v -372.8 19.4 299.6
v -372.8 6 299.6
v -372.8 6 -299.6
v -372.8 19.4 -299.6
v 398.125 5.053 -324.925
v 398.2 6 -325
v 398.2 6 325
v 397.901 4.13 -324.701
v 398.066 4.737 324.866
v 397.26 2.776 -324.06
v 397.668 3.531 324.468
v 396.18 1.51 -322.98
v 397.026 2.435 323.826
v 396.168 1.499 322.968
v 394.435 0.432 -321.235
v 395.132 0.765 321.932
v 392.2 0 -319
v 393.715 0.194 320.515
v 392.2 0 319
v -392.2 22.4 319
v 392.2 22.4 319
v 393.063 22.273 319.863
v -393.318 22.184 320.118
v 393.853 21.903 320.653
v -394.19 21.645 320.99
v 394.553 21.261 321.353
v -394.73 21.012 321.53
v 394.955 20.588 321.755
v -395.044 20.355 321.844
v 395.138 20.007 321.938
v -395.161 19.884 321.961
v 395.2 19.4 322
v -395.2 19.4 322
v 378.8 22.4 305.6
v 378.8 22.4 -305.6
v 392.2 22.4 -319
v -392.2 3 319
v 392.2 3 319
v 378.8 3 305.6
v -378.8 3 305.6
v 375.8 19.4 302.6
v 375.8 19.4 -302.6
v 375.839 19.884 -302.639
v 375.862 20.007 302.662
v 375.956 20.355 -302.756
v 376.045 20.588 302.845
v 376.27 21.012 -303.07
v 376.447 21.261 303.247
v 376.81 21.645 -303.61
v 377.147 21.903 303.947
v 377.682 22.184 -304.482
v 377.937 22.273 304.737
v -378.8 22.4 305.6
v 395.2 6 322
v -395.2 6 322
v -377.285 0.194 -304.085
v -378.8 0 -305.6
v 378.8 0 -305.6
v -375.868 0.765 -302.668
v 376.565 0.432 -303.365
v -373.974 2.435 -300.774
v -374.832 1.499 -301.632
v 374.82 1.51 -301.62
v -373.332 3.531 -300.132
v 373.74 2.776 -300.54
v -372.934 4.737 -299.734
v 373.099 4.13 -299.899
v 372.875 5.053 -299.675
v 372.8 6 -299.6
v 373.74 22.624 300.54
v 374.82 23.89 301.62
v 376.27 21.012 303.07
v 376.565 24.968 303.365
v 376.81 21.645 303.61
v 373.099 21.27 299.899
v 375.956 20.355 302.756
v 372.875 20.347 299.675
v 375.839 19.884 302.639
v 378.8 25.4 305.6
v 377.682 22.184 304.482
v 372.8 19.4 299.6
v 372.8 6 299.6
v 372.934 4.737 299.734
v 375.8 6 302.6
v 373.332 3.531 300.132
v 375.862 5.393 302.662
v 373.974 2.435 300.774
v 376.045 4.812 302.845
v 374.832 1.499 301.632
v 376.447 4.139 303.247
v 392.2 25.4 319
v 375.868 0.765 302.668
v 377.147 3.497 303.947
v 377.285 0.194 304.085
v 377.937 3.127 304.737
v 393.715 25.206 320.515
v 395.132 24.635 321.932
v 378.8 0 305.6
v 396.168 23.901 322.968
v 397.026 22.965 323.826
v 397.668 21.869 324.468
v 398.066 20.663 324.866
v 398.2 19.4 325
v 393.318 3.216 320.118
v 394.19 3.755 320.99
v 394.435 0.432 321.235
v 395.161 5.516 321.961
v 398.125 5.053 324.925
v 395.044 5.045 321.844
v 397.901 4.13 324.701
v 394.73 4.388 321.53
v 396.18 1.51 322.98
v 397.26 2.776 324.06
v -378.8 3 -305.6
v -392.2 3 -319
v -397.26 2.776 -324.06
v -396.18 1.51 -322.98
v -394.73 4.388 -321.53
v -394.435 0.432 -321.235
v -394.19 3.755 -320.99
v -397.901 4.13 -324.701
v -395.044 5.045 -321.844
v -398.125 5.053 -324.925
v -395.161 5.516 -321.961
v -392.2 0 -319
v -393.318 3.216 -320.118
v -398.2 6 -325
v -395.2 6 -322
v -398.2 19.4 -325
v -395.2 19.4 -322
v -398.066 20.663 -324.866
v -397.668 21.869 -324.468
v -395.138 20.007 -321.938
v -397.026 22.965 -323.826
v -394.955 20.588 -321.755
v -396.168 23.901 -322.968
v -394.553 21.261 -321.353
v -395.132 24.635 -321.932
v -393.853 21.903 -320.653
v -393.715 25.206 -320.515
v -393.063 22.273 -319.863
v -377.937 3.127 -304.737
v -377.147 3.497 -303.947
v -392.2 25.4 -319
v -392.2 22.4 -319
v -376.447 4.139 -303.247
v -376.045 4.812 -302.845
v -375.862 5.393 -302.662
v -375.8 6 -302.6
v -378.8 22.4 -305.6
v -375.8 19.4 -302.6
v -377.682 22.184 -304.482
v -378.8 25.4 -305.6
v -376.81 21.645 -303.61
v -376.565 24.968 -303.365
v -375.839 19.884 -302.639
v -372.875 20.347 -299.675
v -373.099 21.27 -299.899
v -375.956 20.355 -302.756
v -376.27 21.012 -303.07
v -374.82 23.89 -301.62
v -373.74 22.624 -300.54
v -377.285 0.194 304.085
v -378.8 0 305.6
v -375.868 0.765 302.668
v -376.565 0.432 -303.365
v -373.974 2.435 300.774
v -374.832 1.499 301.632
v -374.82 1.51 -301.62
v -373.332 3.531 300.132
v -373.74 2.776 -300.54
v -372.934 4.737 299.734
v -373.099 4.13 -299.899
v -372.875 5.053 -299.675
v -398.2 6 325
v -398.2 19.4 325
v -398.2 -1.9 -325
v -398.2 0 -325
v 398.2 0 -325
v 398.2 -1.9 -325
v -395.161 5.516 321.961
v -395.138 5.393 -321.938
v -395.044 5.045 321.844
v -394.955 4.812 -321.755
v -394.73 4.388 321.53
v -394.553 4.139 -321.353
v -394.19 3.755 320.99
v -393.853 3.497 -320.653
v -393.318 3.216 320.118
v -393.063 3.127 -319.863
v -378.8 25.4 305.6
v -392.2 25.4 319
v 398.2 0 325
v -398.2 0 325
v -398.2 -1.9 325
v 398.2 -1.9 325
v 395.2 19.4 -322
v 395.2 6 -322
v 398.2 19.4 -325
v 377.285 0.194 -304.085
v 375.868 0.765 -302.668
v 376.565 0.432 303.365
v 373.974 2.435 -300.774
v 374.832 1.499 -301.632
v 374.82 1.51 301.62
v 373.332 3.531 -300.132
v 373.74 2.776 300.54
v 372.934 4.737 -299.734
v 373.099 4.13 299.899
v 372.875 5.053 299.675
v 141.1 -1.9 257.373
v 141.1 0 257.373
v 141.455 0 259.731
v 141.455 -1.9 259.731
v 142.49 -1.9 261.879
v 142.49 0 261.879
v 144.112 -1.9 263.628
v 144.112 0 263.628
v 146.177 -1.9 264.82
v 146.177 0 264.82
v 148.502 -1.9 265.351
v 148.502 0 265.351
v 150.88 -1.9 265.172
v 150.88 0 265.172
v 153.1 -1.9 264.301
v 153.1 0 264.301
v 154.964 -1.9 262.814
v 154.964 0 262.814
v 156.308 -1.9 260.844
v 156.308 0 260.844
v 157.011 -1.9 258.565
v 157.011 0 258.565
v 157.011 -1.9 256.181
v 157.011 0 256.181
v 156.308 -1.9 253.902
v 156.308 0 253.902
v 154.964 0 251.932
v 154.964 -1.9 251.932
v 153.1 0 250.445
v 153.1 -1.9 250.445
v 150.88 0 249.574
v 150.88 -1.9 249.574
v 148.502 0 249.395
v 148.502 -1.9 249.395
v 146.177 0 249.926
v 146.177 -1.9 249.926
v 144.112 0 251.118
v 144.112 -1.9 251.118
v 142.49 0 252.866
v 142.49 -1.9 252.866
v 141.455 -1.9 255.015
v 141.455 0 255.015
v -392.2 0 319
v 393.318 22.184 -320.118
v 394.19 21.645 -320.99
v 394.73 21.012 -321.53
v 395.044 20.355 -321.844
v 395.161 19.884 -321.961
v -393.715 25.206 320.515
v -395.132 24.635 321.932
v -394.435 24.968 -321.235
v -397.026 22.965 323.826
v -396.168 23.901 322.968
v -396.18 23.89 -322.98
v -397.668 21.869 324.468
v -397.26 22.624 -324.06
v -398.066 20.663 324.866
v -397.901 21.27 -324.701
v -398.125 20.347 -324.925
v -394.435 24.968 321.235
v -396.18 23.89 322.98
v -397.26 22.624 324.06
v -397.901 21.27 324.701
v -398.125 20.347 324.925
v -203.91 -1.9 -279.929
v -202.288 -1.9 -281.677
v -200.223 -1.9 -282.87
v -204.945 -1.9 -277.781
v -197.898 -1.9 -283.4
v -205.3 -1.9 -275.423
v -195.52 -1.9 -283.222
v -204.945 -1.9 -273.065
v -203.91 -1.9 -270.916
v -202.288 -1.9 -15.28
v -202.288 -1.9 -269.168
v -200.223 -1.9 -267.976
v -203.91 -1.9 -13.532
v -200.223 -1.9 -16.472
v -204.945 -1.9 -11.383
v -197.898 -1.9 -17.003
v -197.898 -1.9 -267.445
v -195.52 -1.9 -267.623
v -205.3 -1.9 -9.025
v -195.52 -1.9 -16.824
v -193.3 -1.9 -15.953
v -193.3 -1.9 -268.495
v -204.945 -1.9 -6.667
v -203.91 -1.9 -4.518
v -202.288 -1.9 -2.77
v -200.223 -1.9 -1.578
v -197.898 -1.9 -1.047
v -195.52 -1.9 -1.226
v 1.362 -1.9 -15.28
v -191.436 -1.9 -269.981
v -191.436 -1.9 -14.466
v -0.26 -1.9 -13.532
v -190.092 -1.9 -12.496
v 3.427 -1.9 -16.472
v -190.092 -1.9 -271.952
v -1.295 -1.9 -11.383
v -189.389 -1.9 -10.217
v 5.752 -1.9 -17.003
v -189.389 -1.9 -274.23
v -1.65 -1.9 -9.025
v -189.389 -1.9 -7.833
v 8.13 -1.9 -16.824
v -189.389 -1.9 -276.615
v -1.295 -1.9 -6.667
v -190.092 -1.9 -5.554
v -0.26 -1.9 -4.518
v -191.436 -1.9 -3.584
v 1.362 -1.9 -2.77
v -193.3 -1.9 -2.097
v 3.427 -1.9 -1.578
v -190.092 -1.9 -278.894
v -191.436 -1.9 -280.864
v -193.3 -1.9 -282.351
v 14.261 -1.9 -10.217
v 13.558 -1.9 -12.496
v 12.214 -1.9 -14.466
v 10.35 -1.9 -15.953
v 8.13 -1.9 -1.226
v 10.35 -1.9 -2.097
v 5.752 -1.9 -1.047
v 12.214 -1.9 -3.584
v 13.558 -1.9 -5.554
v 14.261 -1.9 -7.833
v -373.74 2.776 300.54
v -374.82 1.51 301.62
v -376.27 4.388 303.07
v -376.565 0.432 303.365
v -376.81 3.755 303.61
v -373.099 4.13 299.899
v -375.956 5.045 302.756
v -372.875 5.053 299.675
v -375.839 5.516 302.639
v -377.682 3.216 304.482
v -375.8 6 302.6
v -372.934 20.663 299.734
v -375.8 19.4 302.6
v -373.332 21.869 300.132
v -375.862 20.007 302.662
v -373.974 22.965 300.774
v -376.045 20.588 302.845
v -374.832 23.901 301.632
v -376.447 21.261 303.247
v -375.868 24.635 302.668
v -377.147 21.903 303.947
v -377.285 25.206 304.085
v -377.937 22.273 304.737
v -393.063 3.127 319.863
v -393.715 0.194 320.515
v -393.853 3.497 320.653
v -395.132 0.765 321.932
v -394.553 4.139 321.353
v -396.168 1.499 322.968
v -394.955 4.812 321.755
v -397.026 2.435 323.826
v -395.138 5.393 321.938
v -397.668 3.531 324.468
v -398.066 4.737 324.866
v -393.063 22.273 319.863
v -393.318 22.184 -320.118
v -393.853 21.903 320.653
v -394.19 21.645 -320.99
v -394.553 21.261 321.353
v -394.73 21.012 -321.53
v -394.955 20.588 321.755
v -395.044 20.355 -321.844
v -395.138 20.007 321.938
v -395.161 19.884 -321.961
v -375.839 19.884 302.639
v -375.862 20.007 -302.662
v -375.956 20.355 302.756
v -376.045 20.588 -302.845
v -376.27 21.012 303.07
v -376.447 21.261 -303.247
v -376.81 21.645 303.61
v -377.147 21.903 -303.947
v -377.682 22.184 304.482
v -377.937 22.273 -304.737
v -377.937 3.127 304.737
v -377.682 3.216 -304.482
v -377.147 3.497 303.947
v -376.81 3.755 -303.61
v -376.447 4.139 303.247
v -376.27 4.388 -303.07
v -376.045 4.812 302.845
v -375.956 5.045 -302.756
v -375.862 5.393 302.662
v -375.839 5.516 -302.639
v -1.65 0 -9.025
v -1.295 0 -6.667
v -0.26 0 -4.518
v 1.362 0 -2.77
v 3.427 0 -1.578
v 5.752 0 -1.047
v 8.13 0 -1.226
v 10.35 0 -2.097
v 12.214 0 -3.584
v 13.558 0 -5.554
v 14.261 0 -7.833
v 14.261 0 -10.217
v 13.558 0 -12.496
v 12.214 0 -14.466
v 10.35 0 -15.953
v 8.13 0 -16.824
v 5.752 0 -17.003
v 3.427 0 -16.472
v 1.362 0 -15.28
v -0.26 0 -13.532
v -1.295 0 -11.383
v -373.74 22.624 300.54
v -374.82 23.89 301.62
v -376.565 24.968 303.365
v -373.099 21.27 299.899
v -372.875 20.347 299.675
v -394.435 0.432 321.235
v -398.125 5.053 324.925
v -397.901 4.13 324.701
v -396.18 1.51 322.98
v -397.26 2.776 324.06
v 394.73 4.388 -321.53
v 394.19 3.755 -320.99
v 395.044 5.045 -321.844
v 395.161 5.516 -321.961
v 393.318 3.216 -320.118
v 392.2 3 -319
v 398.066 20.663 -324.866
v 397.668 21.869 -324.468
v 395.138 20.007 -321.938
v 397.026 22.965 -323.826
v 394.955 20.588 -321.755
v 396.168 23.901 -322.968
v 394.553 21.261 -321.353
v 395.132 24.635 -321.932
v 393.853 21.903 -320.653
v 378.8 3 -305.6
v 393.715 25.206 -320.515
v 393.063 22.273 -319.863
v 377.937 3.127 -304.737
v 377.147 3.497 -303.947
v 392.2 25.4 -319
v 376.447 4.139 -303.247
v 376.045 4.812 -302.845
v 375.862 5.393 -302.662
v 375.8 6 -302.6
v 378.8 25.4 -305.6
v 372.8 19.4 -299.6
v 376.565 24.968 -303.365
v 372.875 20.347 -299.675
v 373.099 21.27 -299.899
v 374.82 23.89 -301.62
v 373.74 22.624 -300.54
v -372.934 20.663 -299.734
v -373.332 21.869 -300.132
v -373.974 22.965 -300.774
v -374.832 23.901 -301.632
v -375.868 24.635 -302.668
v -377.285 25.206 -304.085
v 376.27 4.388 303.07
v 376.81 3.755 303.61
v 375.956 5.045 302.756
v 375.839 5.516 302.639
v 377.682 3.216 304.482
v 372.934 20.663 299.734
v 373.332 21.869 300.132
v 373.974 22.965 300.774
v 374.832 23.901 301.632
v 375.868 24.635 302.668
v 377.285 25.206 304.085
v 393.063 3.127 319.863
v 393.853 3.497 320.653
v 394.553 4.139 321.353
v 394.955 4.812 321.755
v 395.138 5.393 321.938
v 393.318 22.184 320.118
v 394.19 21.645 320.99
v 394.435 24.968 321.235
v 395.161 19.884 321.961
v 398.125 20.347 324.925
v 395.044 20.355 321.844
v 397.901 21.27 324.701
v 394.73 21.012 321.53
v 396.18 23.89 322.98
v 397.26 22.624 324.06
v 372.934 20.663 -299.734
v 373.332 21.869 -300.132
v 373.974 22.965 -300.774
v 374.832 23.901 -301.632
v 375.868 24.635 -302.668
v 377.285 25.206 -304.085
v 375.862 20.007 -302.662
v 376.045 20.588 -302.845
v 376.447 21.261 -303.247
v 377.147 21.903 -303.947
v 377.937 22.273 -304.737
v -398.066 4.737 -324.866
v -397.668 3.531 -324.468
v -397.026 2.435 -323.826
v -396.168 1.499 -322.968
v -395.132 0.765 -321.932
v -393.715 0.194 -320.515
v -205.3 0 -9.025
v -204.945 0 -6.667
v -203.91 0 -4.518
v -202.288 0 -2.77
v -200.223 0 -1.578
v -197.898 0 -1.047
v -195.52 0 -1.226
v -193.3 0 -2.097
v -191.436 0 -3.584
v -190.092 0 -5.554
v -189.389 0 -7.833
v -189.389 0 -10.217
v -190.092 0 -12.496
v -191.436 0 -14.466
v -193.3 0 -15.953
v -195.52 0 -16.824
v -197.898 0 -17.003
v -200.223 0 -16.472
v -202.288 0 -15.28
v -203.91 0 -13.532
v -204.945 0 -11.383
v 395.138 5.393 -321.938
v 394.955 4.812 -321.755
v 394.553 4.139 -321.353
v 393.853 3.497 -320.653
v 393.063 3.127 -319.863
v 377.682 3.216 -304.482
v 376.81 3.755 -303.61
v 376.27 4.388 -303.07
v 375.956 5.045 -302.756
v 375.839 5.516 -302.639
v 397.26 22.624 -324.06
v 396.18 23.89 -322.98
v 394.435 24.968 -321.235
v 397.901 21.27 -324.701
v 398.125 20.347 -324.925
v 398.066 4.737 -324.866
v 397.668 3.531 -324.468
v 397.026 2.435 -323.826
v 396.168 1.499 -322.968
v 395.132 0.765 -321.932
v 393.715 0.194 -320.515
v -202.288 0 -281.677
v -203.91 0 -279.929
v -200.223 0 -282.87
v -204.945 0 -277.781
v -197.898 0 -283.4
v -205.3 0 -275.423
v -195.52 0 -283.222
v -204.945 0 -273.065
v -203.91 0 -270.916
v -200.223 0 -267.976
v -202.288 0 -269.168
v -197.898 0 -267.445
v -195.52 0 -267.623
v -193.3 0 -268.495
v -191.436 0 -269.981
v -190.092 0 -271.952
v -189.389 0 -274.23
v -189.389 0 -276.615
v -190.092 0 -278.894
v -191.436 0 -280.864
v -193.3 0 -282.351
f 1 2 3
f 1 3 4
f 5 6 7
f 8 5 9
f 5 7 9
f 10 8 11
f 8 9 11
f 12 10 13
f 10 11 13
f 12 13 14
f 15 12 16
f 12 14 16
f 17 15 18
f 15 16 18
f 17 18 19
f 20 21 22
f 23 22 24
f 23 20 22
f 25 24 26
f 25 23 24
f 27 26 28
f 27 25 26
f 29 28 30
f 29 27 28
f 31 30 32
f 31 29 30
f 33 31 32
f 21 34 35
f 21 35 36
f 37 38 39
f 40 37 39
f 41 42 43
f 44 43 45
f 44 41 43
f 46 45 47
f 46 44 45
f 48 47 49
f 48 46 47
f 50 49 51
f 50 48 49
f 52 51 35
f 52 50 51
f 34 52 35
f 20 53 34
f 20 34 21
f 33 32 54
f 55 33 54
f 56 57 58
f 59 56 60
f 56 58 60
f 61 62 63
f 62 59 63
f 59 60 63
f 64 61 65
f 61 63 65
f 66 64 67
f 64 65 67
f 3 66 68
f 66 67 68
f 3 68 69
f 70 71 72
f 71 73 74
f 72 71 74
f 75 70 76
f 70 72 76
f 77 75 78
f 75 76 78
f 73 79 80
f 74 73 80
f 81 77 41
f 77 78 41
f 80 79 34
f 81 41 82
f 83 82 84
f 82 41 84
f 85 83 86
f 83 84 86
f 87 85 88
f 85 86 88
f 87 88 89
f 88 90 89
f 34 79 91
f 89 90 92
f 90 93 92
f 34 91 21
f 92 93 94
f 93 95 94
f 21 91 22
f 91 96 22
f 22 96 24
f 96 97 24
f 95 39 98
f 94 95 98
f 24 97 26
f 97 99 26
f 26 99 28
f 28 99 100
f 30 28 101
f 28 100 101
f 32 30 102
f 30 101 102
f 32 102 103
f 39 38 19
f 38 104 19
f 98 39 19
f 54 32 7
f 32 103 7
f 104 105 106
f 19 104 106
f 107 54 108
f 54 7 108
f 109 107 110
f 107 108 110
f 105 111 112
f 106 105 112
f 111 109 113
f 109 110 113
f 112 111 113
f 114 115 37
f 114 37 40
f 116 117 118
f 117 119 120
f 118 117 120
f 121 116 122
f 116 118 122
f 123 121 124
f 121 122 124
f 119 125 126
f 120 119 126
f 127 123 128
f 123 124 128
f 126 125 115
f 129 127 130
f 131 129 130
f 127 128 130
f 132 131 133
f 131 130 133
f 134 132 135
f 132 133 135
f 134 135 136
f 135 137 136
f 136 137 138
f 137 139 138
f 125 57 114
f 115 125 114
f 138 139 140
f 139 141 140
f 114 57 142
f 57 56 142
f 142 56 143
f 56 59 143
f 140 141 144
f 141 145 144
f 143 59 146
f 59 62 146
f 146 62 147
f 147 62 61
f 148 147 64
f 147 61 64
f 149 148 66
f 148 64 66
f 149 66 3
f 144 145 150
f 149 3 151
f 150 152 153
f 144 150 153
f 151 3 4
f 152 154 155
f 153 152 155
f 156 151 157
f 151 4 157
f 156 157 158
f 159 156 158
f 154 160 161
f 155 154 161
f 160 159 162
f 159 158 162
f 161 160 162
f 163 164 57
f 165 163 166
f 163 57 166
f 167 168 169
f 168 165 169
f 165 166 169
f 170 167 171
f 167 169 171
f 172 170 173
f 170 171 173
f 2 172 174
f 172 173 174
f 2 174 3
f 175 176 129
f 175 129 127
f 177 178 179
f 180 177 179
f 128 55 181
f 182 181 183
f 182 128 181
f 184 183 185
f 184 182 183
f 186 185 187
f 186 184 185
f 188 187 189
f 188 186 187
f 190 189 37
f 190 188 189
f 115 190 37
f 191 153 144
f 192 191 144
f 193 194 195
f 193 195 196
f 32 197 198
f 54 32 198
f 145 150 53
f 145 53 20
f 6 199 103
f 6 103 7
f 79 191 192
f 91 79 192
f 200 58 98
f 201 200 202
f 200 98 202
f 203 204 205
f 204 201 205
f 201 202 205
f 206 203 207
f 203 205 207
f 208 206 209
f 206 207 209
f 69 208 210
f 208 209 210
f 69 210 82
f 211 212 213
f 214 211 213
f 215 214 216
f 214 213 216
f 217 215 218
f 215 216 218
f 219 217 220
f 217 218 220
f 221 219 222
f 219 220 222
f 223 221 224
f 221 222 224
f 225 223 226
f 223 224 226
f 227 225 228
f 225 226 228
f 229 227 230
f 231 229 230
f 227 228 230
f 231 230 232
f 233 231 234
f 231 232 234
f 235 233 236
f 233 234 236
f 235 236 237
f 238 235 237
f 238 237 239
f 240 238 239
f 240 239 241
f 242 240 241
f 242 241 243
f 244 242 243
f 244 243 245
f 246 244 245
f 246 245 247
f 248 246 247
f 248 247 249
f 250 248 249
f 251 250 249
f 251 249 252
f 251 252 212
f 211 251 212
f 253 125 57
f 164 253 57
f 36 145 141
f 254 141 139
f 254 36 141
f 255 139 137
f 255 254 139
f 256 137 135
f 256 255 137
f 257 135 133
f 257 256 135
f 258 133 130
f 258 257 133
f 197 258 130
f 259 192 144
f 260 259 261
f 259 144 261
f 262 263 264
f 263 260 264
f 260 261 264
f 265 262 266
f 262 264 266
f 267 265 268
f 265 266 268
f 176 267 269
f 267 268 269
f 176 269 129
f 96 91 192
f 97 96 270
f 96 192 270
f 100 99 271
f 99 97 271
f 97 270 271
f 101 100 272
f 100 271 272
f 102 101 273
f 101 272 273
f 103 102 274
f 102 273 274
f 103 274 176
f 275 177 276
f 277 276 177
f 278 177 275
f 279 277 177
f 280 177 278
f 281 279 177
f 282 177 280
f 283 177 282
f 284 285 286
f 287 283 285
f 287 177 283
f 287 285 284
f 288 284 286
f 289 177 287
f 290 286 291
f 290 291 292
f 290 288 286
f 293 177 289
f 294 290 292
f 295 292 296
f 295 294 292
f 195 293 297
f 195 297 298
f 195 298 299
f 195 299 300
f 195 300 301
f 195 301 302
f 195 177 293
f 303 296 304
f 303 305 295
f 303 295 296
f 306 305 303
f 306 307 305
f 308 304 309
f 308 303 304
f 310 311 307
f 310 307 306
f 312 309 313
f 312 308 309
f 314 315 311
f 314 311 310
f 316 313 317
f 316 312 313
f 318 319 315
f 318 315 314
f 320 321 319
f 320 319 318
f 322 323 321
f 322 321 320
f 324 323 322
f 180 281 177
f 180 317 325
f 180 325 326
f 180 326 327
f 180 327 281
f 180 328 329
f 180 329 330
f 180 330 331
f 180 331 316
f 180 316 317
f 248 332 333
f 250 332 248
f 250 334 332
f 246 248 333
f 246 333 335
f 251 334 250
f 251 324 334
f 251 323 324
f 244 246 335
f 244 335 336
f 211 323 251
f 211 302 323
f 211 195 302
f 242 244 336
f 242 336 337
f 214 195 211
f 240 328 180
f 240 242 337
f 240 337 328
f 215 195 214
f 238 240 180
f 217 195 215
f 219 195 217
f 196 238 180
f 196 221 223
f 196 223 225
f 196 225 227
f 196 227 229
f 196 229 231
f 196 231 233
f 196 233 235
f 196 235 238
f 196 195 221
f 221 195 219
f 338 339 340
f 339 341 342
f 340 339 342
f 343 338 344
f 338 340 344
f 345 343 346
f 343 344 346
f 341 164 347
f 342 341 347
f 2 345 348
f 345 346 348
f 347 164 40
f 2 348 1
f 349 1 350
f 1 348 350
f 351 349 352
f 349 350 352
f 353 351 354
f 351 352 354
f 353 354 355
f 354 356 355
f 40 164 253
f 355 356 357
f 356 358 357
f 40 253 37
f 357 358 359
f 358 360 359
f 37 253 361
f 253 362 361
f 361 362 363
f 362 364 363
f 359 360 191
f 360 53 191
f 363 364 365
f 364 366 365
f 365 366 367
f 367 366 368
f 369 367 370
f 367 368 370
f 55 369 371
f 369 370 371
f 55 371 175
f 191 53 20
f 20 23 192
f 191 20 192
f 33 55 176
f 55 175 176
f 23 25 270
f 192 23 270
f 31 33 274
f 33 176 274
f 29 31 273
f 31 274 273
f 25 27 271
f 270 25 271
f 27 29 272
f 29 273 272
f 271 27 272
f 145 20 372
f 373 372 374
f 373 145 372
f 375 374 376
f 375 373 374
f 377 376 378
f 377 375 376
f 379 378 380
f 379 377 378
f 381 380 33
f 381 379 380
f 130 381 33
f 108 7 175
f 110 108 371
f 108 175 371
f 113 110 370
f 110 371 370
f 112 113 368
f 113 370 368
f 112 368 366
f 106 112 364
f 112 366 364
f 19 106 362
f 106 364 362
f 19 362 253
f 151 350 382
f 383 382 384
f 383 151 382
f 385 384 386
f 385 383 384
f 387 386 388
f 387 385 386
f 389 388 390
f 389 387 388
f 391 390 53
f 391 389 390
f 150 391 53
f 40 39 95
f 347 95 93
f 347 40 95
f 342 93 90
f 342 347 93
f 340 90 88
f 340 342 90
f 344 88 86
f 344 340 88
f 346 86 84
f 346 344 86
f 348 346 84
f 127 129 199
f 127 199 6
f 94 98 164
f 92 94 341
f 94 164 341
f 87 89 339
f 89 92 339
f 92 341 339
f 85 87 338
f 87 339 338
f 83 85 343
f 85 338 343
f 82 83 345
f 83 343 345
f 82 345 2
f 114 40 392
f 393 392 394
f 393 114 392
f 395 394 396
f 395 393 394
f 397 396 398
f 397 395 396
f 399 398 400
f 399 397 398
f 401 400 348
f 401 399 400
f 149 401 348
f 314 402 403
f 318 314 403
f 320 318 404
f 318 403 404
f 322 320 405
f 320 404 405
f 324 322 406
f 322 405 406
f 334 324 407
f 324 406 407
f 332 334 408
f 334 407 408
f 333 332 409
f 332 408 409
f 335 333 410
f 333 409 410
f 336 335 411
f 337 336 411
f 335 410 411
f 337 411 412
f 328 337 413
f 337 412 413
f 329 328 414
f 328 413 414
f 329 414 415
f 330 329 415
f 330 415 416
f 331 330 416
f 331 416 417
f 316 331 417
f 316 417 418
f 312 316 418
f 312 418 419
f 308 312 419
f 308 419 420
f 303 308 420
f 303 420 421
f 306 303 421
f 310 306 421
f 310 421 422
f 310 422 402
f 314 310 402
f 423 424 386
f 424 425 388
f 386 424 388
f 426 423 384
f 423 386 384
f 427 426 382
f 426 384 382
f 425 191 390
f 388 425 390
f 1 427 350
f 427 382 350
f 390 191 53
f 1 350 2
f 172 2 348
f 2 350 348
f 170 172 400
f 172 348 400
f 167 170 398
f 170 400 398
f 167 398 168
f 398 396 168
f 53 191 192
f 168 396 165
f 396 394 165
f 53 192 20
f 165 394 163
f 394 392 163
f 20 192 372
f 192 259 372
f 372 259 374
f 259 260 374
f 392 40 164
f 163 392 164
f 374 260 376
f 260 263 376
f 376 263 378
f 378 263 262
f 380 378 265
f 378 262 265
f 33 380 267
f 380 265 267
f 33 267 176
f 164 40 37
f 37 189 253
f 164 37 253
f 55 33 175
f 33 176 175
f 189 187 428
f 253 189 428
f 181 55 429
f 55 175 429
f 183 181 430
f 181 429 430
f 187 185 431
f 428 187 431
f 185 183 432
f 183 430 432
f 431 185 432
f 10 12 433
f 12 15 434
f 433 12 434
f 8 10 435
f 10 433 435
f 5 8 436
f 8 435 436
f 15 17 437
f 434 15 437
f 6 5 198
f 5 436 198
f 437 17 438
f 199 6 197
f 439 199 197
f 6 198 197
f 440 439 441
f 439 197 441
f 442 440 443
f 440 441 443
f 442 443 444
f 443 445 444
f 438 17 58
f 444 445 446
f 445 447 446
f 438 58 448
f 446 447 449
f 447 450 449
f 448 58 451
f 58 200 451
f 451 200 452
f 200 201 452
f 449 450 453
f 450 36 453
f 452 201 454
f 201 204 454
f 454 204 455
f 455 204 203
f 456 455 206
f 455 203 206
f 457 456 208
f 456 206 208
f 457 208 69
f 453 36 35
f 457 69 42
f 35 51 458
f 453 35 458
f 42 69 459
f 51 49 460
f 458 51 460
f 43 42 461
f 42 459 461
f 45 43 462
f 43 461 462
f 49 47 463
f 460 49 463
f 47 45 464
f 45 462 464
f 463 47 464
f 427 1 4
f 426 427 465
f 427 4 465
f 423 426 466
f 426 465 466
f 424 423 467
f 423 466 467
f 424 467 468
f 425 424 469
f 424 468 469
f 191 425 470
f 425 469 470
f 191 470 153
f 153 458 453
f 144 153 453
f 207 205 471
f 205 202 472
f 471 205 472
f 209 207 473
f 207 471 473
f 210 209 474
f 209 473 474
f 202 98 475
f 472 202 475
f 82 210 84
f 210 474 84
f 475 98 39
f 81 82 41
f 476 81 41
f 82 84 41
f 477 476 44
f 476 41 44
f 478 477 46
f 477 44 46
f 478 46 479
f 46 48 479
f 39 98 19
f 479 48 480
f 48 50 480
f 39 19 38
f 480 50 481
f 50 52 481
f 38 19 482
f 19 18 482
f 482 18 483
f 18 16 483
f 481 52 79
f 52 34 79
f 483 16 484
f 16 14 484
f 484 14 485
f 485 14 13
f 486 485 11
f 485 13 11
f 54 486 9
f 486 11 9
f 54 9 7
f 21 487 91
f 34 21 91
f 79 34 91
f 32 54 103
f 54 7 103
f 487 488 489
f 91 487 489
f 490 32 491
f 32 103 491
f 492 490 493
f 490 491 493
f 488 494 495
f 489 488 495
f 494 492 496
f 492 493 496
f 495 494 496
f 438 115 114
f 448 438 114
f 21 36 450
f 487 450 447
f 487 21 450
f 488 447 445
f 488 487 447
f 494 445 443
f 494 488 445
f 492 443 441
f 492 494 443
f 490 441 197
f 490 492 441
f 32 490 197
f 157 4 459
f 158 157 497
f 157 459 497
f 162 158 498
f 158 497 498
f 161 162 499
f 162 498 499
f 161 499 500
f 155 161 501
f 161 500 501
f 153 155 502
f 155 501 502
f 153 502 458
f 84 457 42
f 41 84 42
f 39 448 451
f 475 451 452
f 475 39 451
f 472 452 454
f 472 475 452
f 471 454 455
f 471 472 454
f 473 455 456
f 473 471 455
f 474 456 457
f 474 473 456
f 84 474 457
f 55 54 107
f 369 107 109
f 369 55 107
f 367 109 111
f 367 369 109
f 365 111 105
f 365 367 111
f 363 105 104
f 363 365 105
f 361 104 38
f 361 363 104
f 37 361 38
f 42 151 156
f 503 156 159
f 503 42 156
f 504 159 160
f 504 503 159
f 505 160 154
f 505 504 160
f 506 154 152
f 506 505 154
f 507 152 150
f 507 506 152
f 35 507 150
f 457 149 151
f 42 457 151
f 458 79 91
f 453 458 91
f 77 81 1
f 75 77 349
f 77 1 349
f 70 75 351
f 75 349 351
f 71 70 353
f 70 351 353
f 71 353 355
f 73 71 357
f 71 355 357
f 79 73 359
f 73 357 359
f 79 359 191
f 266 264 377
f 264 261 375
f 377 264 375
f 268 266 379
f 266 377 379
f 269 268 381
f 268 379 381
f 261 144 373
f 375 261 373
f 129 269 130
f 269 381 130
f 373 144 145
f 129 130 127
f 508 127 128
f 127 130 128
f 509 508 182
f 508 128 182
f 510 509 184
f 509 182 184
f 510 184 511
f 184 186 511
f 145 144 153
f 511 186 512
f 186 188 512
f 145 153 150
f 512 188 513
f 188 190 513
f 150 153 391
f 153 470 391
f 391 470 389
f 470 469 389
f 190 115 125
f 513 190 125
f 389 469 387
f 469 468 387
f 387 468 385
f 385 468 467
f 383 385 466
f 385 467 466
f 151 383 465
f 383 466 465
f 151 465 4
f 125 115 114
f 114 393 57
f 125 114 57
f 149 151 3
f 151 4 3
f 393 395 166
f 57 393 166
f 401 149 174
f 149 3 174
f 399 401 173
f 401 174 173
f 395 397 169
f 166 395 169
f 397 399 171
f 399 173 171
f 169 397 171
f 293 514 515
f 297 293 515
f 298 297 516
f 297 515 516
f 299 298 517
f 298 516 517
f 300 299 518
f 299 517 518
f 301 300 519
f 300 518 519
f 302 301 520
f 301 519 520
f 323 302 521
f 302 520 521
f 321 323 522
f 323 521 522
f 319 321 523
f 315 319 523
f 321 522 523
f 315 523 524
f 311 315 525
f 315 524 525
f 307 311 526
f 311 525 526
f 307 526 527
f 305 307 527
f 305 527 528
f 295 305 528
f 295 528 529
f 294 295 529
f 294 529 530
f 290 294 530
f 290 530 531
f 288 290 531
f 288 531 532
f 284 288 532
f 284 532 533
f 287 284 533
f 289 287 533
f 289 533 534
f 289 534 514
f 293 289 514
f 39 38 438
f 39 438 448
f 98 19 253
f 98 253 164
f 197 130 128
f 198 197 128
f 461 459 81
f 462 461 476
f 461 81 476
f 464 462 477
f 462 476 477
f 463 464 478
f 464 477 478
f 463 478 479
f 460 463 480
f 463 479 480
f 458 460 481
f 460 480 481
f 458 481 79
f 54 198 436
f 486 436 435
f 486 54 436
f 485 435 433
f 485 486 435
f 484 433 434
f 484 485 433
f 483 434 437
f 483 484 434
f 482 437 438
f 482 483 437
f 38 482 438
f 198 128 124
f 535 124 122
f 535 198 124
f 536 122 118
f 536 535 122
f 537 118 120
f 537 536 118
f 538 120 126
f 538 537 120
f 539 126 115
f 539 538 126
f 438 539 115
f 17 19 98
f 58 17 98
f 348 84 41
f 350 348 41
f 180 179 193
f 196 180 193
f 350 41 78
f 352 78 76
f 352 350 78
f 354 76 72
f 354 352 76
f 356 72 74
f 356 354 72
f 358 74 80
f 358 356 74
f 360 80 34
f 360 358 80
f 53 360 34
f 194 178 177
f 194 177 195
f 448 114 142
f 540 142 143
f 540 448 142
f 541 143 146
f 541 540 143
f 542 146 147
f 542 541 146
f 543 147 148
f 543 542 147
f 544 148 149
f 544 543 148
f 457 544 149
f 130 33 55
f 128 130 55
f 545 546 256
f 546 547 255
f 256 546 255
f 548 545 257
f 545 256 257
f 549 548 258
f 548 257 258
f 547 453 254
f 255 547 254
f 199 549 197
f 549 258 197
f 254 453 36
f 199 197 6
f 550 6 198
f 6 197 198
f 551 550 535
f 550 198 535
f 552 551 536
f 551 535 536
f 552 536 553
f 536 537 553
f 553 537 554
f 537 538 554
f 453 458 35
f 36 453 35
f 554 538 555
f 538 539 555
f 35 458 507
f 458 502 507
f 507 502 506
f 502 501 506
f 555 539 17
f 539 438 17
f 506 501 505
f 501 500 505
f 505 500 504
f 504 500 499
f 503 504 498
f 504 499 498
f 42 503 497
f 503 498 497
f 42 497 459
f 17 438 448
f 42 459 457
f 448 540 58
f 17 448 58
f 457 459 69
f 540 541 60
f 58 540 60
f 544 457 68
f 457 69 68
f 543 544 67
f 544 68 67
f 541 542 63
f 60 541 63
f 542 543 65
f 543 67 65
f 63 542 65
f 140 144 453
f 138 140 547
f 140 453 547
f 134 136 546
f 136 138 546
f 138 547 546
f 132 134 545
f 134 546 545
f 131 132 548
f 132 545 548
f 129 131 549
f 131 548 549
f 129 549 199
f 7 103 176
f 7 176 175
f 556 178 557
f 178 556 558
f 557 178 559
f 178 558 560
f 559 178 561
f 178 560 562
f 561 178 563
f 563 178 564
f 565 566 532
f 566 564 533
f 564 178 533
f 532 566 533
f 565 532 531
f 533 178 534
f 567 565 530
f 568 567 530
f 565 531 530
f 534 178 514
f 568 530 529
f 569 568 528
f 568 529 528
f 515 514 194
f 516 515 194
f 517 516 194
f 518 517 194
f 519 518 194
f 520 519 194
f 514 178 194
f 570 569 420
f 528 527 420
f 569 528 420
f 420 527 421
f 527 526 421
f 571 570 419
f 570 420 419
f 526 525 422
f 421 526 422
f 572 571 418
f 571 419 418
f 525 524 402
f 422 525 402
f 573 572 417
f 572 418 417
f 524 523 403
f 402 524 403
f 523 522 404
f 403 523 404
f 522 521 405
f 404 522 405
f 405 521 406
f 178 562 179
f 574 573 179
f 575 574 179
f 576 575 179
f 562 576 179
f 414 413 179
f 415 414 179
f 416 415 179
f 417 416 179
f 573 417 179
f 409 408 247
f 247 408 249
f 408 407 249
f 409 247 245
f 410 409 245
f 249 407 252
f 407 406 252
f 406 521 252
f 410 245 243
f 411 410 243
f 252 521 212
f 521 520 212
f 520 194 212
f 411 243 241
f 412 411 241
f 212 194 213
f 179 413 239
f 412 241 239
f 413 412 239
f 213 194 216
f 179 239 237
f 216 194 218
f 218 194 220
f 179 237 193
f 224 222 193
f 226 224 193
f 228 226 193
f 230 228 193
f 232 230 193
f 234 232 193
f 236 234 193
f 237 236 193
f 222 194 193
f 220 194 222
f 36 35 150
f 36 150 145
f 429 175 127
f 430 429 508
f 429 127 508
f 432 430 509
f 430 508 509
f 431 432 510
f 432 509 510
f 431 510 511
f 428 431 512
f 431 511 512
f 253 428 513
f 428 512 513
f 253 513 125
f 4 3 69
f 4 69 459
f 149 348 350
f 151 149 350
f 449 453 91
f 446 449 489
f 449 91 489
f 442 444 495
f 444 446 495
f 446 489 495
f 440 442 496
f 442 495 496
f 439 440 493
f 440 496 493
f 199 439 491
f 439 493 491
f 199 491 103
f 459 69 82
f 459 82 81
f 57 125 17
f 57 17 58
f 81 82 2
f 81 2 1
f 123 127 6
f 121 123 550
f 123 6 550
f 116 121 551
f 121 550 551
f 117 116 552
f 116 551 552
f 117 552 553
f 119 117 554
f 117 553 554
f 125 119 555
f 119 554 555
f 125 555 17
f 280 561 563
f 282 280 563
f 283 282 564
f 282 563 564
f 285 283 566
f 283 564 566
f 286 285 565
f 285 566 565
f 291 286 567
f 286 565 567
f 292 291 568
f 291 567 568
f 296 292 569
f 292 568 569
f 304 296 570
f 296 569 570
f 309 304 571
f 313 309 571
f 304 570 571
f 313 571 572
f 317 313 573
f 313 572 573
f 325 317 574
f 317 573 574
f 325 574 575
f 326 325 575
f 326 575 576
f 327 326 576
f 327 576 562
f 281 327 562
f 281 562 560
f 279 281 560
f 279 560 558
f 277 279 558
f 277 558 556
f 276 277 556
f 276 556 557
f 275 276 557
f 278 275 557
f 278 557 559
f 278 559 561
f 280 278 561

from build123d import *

# Parameters (mm, degrees)
TUBO_CUADRADO_2_X_2_X_0_25_1_DEPTH      = 686.921024484
TUBO_CUADRADO_2_X_2_X_0_25_1_DEPTH_BACK = 36.921024484
TUBO_CUADRADO_2_X_2_X_0_25_1_2_DEPTH    = 870.242048969
TUBO_CUADRADO_2_X_2_X_0_25_1_3_DEPTH    = 723.842048969
TUBO_CUADRADO_2_X_2_X_0_25_1_4_DEPTH    = 870.242048969
CROQUIS3_W                              = 796.4
CROQUIS3_H                              = 650
SALIENTE_EXTRUIR1_DEPTH                 = 1.9
CROQUIS5_R                              = 8
CORTAR_EXTRUIR1_DEPTH                   = 10


with BuildPart() as part:
    # Sketch1 → Tubo cuadrado 2 X 2 X 0.25(1) (new, two sides: drawn at the far end of the back side and taken through both)
    with BuildSketch(Plane(origin=(-385.5, 12.7, -325), x_dir=(1, 0, 0), z_dir=(0, 0, 1)).offset(-TUBO_CUADRADO_2_X_2_X_0_25_1_DEPTH_BACK)):
        with BuildLine():
            Line((-6.7, -12.7), (6.7, -12.7))
            ThreePointArc((6.7, -12.7), (10.942640687, -10.942640687), (12.7, -6.7))
            Line((12.7, -6.7), (12.7, 6.7))
            ThreePointArc((12.7, 6.7), (10.942640687, 10.942640687), (6.7, 12.7))
            Line((6.7, 12.7), (-6.7, 12.7))
            ThreePointArc((-6.7, 12.7), (-10.942640687, 10.942640687), (-12.7, 6.7))
            Line((-12.7, 6.7), (-12.7, -6.7))
            ThreePointArc((-12.7, -6.7), (-10.942640687, -10.942640687), (-6.7, -12.7))
        make_face()
        with BuildLine():
            Line((-6.7, -9.7), (6.7, -9.7))
            ThreePointArc((6.7, -9.7), (8.821320344, -8.821320344), (9.7, -6.7))
            Line((9.7, -6.7), (9.7, 6.7))
            ThreePointArc((9.7, 6.7), (8.821320344, 8.821320344), (6.7, 9.7))
            Line((6.7, 9.7), (-6.7, 9.7))
            ThreePointArc((-6.7, 9.7), (-8.821320344, 8.821320344), (-9.7, 6.7))
            Line((-9.7, 6.7), (-9.7, -6.7))
            ThreePointArc((-9.7, -6.7), (-8.821320344, -8.821320344), (-6.7, -9.7))
        make_face(mode=Mode.SUBTRACT)
    extrude(amount=TUBO_CUADRADO_2_X_2_X_0_25_1_DEPTH + TUBO_CUADRADO_2_X_2_X_0_25_1_DEPTH_BACK)

    # Tubo cuadrado 2 X 2 X 0.25(1) mitre 1
    split(bisect_by=Plane(origin=(-398.2, 0, -325), x_dir=(0, -1, 0), z_dir=(-0.707106781, 0, 0.707106781)), keep=Keep.TOP)

    # Tubo cuadrado 2 X 2 X 0.25(1) mitre 2
    split(bisect_by=Plane(origin=(-398.2, 0, 325), x_dir=(0, -1, 0), z_dir=(-0.707106781, 0, -0.707106781)), keep=Keep.TOP)


with BuildPart() as body_2:
    # Sketch1 on segment 2 (carried to segment 2) → Tubo cuadrado 2 X 2 X 0.25_1 2 (new body)
    with BuildSketch(Plane(origin=(-435.121024484, 12.7, 312.3), x_dir=(0, 0, -1), z_dir=(1, 0, 0))):
        with BuildLine():
            Line((-6.7, -12.7), (6.7, -12.7))
            ThreePointArc((6.7, -12.7), (10.942640687, -10.942640687), (12.7, -6.7))
            Line((12.7, -6.7), (12.7, 6.7))
            ThreePointArc((12.7, 6.7), (10.942640687, 10.942640687), (6.7, 12.7))
            Line((6.7, 12.7), (-6.7, 12.7))
            ThreePointArc((-6.7, 12.7), (-10.942640687, 10.942640687), (-12.7, 6.7))
            Line((-12.7, 6.7), (-12.7, -6.7))
            ThreePointArc((-12.7, -6.7), (-10.942640687, -10.942640687), (-6.7, -12.7))
        make_face()
        with BuildLine():
            Line((-6.7, -9.7), (6.7, -9.7))
            ThreePointArc((6.7, -9.7), (8.821320344, -8.821320344), (9.7, -6.7))
            Line((9.7, -6.7), (9.7, 6.7))
            ThreePointArc((9.7, 6.7), (8.821320344, 8.821320344), (6.7, 9.7))
            Line((6.7, 9.7), (-6.7, 9.7))
            ThreePointArc((-6.7, 9.7), (-8.821320344, 8.821320344), (-9.7, 6.7))
            Line((-9.7, 6.7), (-9.7, -6.7))
            ThreePointArc((-9.7, -6.7), (-8.821320344, -8.821320344), (-6.7, -9.7))
        make_face(mode=Mode.SUBTRACT)
    extrude(amount=TUBO_CUADRADO_2_X_2_X_0_25_1_2_DEPTH)

    # Tubo cuadrado 2 X 2 X 0.25_1 2 mitre 1
    split(bisect_by=Plane(origin=(-398.2, 0, 325), x_dir=(0, 1, 0), z_dir=(0.707106781, 0, 0.707106781)), keep=Keep.TOP)

    # Tubo cuadrado 2 X 2 X 0.25_1 2 mitre 2
    split(bisect_by=Plane(origin=(398.2, 0, 325), x_dir=(0, -1, 0), z_dir=(-0.707106781, 0, 0.707106781)), keep=Keep.TOP)


with BuildPart() as body_3:
    # Sketch1 on segment 3 (carried to segment 3) → Tubo cuadrado 2 X 2 X 0.25_1 3 (new body)
    with BuildSketch(Plane(origin=(385.5, 12.7, 361.921024484), x_dir=(-1, 0, 0), z_dir=(0, 0, -1))):
        with BuildLine():
            Line((-6.7, -12.7), (6.7, -12.7))
            ThreePointArc((6.7, -12.7), (10.942640687, -10.942640687), (12.7, -6.7))
            Line((12.7, -6.7), (12.7, 6.7))
            ThreePointArc((12.7, 6.7), (10.942640687, 10.942640687), (6.7, 12.7))
            Line((6.7, 12.7), (-6.7, 12.7))
            ThreePointArc((-6.7, 12.7), (-10.942640687, 10.942640687), (-12.7, 6.7))
            Line((-12.7, 6.7), (-12.7, -6.7))
            ThreePointArc((-12.7, -6.7), (-10.942640687, -10.942640687), (-6.7, -12.7))
        make_face()
        with BuildLine():
            Line((-6.7, -9.7), (6.7, -9.7))
            ThreePointArc((6.7, -9.7), (8.821320344, -8.821320344), (9.7, -6.7))
            Line((9.7, -6.7), (9.7, 6.7))
            ThreePointArc((9.7, 6.7), (8.821320344, 8.821320344), (6.7, 9.7))
            Line((6.7, 9.7), (-6.7, 9.7))
            ThreePointArc((-6.7, 9.7), (-8.821320344, 8.821320344), (-9.7, 6.7))
            Line((-9.7, 6.7), (-9.7, -6.7))
            ThreePointArc((-9.7, -6.7), (-8.821320344, -8.821320344), (-6.7, -9.7))
        make_face(mode=Mode.SUBTRACT)
    extrude(amount=TUBO_CUADRADO_2_X_2_X_0_25_1_3_DEPTH)

    # Tubo cuadrado 2 X 2 X 0.25_1 3 mitre 1
    split(bisect_by=Plane(origin=(398.2, 0, -325), x_dir=(0, 1, 0), z_dir=(0.707106781, 0, 0.707106781)), keep=Keep.TOP)

    # Tubo cuadrado 2 X 2 X 0.25_1 3 mitre 2
    split(bisect_by=Plane(origin=(398.2, 0, 325), x_dir=(0, 1, 0), z_dir=(0.707106781, 0, -0.707106781)), keep=Keep.TOP)


with BuildPart() as body_4:
    # Sketch1 on segment 4 (carried to segment 4) → Tubo cuadrado 2 X 2 X 0.25_1 4 (new body)
    with BuildSketch(Plane(origin=(435.121024484, 12.7, -312.3), x_dir=(0, 0, 1), z_dir=(-1, 0, 0))):
        with BuildLine():
            Line((-6.7, -12.7), (6.7, -12.7))
            ThreePointArc((6.7, -12.7), (10.942640687, -10.942640687), (12.7, -6.7))
            Line((12.7, -6.7), (12.7, 6.7))
            ThreePointArc((12.7, 6.7), (10.942640687, 10.942640687), (6.7, 12.7))
            Line((6.7, 12.7), (-6.7, 12.7))
            ThreePointArc((-6.7, 12.7), (-10.942640687, 10.942640687), (-12.7, 6.7))
            Line((-12.7, 6.7), (-12.7, -6.7))
            ThreePointArc((-12.7, -6.7), (-10.942640687, -10.942640687), (-6.7, -12.7))
        make_face()
        with BuildLine():
            Line((-6.7, -9.7), (6.7, -9.7))
            ThreePointArc((6.7, -9.7), (8.821320344, -8.821320344), (9.7, -6.7))
            Line((9.7, -6.7), (9.7, 6.7))
            ThreePointArc((9.7, 6.7), (8.821320344, 8.821320344), (6.7, 9.7))
            Line((6.7, 9.7), (-6.7, 9.7))
            ThreePointArc((-6.7, 9.7), (-8.821320344, 8.821320344), (-9.7, 6.7))
            Line((-9.7, 6.7), (-9.7, -6.7))
            ThreePointArc((-9.7, -6.7), (-8.821320344, -8.821320344), (-6.7, -9.7))
        make_face(mode=Mode.SUBTRACT)
    extrude(amount=TUBO_CUADRADO_2_X_2_X_0_25_1_4_DEPTH)

    # Tubo cuadrado 2 X 2 X 0.25_1 4 mitre 1
    split(bisect_by=Plane(origin=(-398.2, 0, -325), x_dir=(0, 1, 0), z_dir=(0.707106781, 0, -0.707106781)), keep=Keep.TOP)

    # Tubo cuadrado 2 X 2 X 0.25_1 4 mitre 2
    split(bisect_by=Plane(origin=(398.2, 0, -325), x_dir=(0, -1, 0), z_dir=(-0.707106781, 0, -0.707106781)), keep=Keep.TOP)


with BuildPart() as body_5:
    # Croquis3 → Saliente-Extruir1 (new body)
    with BuildSketch(Plane.XZ):
        Rectangle(CROQUIS3_W, CROQUIS3_H)
    extrude(amount=SALIENTE_EXTRUIR1_DEPTH)

    # Croquis5 → Cortar-Extruir1 (cut)
    with BuildSketch(Plane(origin=(0, 0, 0), x_dir=(1, 0, 0), z_dir=(0, 1, 0))):
        with Locations(Location((149.099999998, -257.372933, 0), (0, 0, 180))):
            Circle(CROQUIS5_R)
        with Locations(Location((6.349999921, 9.025, 0), (0, 0, 180))):
            Circle(CROQUIS5_R)
        with Locations(Location((-197.299999999, 9.025, 0), (0, 0, 180))):
            Circle(CROQUIS5_R)
        with Locations(Location((-197.299999999, 275.422795334, 0), (0, 0, 180))):
            Circle(CROQUIS5_R)
    extrude(amount=-CORTAR_EXTRUIR1_DEPTH, mode=Mode.SUBTRACT)


solid = Compound([part.part, body_2.part, body_3.part, body_4.part, body_5.part])
